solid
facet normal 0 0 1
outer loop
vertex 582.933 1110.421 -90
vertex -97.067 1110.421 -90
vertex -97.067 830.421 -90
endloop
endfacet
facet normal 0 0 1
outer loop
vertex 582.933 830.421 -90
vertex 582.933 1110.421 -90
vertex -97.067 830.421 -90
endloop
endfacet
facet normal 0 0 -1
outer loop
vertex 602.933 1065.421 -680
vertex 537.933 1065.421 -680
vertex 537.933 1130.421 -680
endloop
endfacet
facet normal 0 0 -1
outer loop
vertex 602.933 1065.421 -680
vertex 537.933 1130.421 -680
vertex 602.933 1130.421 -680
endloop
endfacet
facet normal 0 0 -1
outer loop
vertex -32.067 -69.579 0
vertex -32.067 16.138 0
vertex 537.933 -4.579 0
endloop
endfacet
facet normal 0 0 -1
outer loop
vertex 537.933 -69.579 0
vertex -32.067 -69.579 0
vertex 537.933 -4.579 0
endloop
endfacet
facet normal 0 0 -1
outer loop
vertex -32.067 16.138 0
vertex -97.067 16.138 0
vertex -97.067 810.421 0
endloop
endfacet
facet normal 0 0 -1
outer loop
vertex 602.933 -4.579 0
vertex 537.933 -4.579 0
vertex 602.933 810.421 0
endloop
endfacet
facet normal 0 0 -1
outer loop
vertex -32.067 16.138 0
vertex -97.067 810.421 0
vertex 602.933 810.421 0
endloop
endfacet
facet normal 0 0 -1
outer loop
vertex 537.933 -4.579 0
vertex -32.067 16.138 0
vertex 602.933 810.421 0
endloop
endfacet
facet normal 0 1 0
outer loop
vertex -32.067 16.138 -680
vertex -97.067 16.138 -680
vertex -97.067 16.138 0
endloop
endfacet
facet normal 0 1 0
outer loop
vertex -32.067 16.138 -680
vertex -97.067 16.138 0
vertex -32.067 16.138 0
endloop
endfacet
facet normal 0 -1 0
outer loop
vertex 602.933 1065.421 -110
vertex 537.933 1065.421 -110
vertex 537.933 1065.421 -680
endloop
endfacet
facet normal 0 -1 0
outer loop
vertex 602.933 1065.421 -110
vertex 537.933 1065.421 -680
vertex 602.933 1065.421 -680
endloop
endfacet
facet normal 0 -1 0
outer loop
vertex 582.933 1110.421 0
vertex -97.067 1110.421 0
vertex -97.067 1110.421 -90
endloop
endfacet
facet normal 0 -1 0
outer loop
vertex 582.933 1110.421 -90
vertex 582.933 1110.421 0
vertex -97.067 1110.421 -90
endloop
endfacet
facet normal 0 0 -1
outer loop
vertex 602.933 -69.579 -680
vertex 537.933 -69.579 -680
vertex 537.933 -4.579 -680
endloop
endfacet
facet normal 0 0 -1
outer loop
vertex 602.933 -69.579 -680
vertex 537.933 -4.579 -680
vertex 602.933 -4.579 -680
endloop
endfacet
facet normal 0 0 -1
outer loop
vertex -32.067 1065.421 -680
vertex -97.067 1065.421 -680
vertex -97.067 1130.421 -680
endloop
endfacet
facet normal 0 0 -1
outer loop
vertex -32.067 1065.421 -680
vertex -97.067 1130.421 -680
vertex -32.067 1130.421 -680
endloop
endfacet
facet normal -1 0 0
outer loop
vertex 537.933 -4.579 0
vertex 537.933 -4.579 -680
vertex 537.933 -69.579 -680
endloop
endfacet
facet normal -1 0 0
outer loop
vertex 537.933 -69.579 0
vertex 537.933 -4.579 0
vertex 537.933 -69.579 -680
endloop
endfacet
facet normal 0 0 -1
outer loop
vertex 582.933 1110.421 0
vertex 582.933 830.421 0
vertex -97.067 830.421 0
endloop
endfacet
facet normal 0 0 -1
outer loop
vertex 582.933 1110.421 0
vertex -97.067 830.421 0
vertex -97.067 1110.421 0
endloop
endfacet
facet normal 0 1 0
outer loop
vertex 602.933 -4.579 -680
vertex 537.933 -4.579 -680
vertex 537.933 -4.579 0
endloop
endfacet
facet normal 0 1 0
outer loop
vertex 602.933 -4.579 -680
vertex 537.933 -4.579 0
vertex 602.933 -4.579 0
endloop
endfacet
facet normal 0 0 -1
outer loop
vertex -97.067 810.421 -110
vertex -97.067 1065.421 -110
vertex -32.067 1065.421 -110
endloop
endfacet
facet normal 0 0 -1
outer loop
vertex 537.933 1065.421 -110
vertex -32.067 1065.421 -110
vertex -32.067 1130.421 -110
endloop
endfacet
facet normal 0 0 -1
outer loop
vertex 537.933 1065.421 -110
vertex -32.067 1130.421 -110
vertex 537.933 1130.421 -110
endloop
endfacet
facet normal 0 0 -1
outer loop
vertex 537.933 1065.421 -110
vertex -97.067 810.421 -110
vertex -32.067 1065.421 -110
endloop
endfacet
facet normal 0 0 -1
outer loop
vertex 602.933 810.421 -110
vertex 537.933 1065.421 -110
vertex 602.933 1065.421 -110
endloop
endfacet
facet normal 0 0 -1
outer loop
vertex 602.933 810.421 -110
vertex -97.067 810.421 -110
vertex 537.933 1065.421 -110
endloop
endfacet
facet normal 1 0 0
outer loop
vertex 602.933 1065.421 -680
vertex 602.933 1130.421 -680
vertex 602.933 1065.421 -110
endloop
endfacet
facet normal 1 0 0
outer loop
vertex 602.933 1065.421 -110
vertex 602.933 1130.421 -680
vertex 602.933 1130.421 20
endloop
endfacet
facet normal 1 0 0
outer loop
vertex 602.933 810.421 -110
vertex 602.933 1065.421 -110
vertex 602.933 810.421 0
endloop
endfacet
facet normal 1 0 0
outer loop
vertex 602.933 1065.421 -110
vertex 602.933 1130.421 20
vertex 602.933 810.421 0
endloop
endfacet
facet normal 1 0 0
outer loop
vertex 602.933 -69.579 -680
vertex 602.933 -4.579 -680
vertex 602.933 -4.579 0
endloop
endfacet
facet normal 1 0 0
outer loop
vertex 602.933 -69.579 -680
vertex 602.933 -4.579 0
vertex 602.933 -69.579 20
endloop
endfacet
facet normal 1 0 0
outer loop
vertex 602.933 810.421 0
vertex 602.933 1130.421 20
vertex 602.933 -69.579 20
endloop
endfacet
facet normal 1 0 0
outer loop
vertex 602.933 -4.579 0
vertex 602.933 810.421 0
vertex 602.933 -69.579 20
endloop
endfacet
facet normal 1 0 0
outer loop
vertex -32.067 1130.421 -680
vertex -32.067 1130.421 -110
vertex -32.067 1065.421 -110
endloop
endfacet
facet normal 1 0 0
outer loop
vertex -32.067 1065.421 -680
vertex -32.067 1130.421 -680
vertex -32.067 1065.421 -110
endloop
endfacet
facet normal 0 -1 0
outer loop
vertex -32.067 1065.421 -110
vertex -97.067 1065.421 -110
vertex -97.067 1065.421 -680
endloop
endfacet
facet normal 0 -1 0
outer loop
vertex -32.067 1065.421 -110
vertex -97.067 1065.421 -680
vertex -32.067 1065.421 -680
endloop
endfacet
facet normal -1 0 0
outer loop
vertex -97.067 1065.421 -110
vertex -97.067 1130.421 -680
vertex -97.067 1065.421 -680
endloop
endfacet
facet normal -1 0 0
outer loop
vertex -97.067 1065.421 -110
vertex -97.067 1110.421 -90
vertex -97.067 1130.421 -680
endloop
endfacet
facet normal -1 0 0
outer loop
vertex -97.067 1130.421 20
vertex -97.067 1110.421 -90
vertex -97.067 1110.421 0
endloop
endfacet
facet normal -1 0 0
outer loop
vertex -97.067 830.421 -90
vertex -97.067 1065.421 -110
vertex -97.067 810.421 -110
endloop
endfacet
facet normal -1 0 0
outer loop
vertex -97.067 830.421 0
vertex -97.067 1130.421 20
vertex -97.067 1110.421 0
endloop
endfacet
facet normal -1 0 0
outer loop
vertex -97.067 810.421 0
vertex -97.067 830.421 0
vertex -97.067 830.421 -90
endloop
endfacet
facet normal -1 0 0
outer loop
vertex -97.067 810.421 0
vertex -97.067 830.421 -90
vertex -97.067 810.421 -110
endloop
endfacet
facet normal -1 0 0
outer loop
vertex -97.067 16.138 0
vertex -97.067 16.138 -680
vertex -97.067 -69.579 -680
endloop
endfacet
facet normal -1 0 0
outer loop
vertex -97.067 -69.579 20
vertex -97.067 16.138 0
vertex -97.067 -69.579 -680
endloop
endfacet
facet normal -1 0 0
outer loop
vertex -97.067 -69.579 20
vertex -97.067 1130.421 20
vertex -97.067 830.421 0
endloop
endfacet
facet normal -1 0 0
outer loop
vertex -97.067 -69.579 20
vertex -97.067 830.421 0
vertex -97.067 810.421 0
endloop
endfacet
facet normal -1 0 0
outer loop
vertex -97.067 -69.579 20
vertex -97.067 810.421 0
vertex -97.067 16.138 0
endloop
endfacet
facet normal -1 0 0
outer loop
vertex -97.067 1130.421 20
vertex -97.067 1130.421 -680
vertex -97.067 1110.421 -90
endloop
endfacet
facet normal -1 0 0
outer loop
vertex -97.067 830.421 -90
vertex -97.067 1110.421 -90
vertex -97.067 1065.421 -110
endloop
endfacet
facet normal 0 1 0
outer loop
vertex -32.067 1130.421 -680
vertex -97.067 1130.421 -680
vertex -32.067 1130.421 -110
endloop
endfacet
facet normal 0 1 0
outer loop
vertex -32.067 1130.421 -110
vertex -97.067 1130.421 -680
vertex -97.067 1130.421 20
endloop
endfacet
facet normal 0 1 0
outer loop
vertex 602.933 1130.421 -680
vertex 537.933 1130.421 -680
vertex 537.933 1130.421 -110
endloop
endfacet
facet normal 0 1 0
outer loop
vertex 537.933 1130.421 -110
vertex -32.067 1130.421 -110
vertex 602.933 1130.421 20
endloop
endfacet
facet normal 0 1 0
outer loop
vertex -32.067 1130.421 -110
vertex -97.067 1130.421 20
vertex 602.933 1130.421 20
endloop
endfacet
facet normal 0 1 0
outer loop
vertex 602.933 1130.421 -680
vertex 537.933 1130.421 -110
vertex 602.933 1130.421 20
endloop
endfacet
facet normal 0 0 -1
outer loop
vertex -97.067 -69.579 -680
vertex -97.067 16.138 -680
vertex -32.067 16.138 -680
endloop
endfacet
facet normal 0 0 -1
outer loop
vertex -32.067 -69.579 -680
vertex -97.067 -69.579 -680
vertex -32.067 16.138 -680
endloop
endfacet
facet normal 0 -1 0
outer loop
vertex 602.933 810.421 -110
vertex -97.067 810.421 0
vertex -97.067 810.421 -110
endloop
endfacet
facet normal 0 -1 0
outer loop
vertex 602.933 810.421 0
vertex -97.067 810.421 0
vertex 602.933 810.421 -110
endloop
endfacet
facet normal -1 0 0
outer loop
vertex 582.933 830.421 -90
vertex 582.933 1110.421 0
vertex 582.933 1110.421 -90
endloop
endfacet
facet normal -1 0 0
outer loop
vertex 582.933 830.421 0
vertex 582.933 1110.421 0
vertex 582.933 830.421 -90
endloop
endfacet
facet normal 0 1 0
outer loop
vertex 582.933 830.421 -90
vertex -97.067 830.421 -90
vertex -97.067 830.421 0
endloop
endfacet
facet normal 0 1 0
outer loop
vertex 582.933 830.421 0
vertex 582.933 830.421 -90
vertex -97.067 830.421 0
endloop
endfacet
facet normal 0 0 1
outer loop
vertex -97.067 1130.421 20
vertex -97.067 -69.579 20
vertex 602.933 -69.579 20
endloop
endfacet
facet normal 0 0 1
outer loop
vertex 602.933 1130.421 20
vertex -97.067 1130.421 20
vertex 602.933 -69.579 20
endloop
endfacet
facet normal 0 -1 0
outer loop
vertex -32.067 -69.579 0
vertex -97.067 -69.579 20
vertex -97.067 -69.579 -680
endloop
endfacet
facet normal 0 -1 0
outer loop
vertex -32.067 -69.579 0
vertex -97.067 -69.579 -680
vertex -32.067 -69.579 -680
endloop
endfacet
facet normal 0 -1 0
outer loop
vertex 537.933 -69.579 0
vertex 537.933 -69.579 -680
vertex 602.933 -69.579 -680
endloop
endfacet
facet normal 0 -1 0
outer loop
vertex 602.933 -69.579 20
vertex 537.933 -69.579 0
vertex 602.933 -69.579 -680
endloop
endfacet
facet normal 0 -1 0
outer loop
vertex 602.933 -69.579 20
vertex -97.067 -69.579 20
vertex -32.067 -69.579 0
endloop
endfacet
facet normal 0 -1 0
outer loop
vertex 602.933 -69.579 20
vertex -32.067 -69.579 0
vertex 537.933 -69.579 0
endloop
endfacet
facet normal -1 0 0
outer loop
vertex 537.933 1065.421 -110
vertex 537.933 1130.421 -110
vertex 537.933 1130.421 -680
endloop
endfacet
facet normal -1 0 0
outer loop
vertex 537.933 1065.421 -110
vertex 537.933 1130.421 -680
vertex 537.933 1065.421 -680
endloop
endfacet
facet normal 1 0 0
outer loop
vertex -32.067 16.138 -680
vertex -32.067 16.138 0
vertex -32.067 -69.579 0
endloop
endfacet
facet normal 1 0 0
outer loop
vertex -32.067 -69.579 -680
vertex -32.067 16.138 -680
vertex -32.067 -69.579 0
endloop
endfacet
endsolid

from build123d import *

# Parameters (mm, degrees)
F0_W     = 700
F0_H     = 1200
F1_DEPTH = 20
F2_W     = 700
F2_H     = 320
F3_DEPTH = 110
F5_DEPTH = 680
F6_W     = 65
F6_H     = 85.7172418142
F6_H_2   = 65
F7_DEPTH = 680
F8_W     = 65
F8_H     = 65
F9_DEPTH = 570


with BuildPart() as f1:
    # F0 (on Top) → F1 (new body)
    with BuildSketch(Plane.XY):
        with Locations((252.932651341, 530.4207488894)):
            Rectangle(F0_W, F0_H)
    extrude(amount=F1_DEPTH)

    # F2 (on face) → F3 (join)
    with BuildSketch(Plane(origin=(0, 0, 0), x_dir=(1, 0, 0), z_dir=(0, 0, -1))):
        with Locations((252.932651341, -970.4207488894)):
            Rectangle(F2_W, F2_H)
    extrude(amount=F3_DEPTH)

    # F4 (on face) → F5 (cut)
    with BuildSketch(Plane(origin=(-97.067348659, 0, 0), x_dir=(0, -1, 0), z_dir=(-1, 0, 0))):
        Polygon((-830.4207488894, -55), (-830.4207488894, 0), (-1110.4207488894, 0), (-1110.4207488894, -55), (-1110.4207488894, -90), (-1005.1395893097, -90), (-830.4207488894, -90), align=None)
    extrude(amount=-F5_DEPTH, mode=Mode.SUBTRACT)

    # F6 (on face) → F7 (join)
    with BuildSketch(Plane(origin=(0, 0, 0), x_dir=(1, 0, 0), z_dir=(0, 0, -1))):
        with Locations((-64.567348659, 26.7206302035)):
            Rectangle(F6_W, F6_H)
        with Locations((570.432651341, 37.0792511106)):
            Rectangle(F6_W, F6_H_2)
    extrude(amount=F7_DEPTH)

    # F8 (on face) → F9 (join)
    with BuildSketch(Plane(origin=(0, 0, -110), x_dir=(1, 0, 0), z_dir=(0, 0, -1))):
        with Locations((-64.567348659, -1097.9207488894)):
            Rectangle(F8_W, F8_H)
        with Locations((570.432651341, -1097.9207488894)):
            Rectangle(F8_W, F8_H)
    extrude(amount=F9_DEPTH)


solid = f1.part
